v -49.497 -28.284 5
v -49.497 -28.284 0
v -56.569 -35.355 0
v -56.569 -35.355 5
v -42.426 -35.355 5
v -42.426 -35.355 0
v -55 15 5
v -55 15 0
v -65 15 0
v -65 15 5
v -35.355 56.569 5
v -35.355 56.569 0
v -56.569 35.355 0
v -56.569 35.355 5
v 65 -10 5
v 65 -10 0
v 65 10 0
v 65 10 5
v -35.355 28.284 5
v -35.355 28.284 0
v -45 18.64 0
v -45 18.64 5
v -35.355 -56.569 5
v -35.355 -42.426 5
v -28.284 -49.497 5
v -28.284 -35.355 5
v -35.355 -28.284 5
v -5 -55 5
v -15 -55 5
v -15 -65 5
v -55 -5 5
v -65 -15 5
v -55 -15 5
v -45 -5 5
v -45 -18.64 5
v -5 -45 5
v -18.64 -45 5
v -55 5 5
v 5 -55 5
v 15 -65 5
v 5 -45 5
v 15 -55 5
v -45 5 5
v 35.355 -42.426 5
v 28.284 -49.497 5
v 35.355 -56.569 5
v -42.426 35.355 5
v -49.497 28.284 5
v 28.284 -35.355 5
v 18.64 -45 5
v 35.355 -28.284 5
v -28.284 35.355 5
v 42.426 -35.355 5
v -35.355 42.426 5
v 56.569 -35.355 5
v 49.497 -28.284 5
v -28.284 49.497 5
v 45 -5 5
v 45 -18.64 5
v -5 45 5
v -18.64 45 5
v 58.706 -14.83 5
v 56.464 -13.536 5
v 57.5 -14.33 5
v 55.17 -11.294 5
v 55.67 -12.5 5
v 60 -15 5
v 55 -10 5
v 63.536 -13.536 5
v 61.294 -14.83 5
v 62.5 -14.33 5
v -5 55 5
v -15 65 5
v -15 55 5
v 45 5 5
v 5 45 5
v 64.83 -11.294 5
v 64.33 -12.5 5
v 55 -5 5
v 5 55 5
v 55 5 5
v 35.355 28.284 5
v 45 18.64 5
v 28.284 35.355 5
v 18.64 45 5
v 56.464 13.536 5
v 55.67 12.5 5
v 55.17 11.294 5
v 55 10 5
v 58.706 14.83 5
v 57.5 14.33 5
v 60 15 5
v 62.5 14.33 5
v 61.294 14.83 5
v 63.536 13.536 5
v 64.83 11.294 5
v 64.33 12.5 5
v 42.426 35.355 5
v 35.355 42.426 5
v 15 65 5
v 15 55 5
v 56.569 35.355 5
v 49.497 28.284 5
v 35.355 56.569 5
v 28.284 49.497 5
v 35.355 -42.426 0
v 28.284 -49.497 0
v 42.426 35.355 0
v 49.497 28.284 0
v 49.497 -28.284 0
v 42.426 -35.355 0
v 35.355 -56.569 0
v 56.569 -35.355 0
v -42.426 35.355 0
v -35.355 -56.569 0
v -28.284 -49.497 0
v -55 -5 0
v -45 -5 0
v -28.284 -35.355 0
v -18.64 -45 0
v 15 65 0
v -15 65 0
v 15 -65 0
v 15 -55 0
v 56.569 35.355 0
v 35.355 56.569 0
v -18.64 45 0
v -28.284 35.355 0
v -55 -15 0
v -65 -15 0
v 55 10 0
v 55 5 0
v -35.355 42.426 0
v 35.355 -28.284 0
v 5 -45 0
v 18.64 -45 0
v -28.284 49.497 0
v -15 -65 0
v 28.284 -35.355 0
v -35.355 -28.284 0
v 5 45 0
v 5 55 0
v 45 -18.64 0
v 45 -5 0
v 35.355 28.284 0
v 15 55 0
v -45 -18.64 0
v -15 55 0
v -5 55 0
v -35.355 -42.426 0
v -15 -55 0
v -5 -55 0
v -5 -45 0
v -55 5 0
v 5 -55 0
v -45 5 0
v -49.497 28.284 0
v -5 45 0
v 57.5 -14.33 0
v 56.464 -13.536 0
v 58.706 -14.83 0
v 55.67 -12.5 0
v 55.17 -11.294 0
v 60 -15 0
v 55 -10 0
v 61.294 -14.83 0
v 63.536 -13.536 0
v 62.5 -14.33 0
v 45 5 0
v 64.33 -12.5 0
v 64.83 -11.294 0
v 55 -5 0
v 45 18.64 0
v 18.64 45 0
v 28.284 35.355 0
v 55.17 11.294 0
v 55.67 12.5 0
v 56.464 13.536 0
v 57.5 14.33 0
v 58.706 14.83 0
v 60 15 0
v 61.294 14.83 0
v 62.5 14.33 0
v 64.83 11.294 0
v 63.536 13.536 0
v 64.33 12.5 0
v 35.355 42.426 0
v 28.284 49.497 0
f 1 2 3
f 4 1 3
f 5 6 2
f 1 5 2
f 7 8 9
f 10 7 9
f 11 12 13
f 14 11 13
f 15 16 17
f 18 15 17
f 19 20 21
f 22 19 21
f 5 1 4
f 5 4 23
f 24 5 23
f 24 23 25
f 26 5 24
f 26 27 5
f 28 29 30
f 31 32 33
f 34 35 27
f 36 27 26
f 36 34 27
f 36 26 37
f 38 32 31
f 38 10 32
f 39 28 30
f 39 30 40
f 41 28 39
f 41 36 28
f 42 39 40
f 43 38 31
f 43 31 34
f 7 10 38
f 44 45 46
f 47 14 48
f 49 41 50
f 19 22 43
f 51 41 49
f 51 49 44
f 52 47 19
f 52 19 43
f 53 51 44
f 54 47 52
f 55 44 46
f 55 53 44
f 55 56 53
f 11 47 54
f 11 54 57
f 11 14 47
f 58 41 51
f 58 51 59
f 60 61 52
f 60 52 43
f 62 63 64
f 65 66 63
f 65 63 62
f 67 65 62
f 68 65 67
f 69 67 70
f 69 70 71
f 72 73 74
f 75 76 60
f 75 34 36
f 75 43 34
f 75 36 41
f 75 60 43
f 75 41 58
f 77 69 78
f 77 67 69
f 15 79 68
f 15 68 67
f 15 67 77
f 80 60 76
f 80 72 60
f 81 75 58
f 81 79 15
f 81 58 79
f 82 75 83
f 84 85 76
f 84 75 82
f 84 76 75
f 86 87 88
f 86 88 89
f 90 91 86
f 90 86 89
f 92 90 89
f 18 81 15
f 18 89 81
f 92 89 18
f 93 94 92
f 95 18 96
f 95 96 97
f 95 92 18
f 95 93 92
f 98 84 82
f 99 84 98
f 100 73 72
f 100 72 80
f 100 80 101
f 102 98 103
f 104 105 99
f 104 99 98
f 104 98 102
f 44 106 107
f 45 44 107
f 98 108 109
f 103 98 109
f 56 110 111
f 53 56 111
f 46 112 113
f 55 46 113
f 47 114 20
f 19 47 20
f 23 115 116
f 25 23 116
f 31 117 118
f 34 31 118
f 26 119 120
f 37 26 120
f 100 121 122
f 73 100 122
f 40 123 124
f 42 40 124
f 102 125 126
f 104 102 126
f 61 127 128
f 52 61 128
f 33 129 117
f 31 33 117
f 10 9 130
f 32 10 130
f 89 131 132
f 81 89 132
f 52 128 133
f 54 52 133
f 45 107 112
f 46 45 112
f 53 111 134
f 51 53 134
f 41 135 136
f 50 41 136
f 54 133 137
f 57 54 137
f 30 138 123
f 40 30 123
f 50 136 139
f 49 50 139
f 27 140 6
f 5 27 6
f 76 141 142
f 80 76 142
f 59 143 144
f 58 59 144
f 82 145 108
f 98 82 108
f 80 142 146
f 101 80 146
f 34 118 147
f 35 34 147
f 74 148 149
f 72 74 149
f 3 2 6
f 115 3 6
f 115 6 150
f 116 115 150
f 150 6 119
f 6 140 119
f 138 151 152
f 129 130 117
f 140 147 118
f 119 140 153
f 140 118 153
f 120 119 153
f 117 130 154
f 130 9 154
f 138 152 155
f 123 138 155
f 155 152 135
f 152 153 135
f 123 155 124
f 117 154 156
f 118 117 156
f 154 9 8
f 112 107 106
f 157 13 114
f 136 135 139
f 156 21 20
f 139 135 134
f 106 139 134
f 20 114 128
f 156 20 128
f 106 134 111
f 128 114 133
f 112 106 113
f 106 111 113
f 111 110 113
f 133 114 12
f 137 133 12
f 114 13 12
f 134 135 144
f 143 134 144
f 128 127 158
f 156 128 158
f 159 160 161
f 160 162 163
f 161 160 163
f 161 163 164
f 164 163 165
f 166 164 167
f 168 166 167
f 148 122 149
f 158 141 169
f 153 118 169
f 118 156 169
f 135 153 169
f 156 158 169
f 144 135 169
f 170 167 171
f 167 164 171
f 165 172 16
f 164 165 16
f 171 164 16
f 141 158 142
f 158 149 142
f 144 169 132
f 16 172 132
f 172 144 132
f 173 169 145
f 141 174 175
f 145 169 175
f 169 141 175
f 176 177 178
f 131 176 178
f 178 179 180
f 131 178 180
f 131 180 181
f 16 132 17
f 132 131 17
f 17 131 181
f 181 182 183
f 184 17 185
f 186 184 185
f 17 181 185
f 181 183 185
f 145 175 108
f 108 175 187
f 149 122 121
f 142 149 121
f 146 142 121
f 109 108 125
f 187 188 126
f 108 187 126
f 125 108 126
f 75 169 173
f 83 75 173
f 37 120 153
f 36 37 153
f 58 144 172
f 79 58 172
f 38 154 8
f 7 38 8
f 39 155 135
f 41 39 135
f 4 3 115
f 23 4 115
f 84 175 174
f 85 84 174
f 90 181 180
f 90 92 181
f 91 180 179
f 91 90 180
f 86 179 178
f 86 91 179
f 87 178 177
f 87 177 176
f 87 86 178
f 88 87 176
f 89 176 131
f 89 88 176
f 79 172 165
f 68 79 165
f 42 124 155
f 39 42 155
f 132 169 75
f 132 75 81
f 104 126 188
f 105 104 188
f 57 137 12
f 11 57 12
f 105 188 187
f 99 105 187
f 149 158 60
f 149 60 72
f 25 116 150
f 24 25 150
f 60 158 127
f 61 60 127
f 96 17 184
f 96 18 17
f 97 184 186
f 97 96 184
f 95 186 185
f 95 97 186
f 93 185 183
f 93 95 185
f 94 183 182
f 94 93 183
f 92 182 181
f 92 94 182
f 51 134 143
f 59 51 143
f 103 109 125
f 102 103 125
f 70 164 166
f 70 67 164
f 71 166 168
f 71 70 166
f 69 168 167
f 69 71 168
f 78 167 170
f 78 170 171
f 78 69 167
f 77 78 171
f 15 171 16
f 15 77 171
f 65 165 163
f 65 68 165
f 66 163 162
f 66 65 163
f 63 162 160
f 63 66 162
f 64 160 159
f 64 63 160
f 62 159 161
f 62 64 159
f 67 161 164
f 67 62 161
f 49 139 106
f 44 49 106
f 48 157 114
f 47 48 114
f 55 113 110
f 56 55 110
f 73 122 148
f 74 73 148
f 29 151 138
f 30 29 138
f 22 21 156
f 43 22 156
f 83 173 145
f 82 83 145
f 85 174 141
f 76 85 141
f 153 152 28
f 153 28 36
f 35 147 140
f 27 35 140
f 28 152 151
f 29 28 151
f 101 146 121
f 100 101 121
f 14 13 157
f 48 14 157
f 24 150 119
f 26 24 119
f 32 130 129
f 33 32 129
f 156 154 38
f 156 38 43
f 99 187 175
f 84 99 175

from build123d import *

# Parameters (mm, degrees)
F0_W     = 10
F0_H     = 10
F1_DEPTH = 5
F2_R     = 4.99999


# Not quite as in the source:
# - a fillet or chamfer is up to 0.001 mm smaller than in the source, because OpenCascade refuses the exact size
# - a feature names something its author has since deleted; it is built from what else it names


with BuildPart() as f1:
    # F0 (on Top) → F1 (new body)
    with BuildSketch(Plane.XY):
        Polygon((15, 65), (-15, 65), (-15, 55), (-5, 55), (5, 55), (15, 55), align=None)
        with Locations((0, 50)):
            Rectangle(F0_W, F0_H)
        Polygon((5, 45), (-5, 45), (-18.6396103068, 45), (18.6396103068, -45), (28.2842712475, -35.3553390593), (35.3553390593, -28.2842712475), (45, -18.6396103068), (45, -5), (45, 5), (45, 18.6396103068), (35.3553390593, 28.2842712475), (28.2842712475, 35.3553390593), (18.6396103068, 45), align=None)
        Polygon((18.6396103068, -45), (-18.6396103068, 45), (-28.2842712475, 35.3553390593), (-35.3553390593, 28.2842712475), (-45, 18.6396103068), (-45, 5), (-45, -5), (-45, -18.6396103068), (-35.3553390593, -28.2842712475), (-28.2842712475, -35.3553390593), (-18.6396103068, -45), (-5, -45), (5, -45), align=None)
        Polygon((-35.3553390593, 28.2842712475), (-28.2842712475, 35.3553390593), (-35.3553390593, 42.4264068712), (-42.4264068712, 35.3553390593), align=None)
        Polygon((35.3553390593, 42.4264068712), (28.2842712475, 35.3553390593), (35.3553390593, 28.2842712475), (42.4264068712, 35.3553390593), align=None)
        Polygon((-42.4264068712, 35.3553390593), (-35.3553390593, 42.4264068712), (-28.2842712475, 49.4974746831), (-35.3553390593, 56.5685424949), (-56.5685424949, 35.3553390593), (-49.4974746831, 28.2842712475), align=None)
        with Locations((0, -50)):
            Rectangle(F0_W, F0_H)
        Polygon((35.3553390593, -28.2842712475), (28.2842712475, -35.3553390593), (35.3553390593, -42.4264068712), (42.4264068712, -35.3553390593), align=None)
        Polygon((28.2842712475, 49.4974746831), (35.3553390593, 42.4264068712), (42.4264068712, 35.3553390593), (49.4974746831, 28.2842712475), (56.5685424949, 35.3553390593), (35.3553390593, 56.5685424949), align=None)
        Polygon((15, -55), (5, -55), (-5, -55), (-15, -55), (-15, -65), (15, -65), align=None)
        Polygon((42.4264068712, -35.3553390593), (35.3553390593, -42.4264068712), (28.2842712475, -49.4974746831), (35.3553390593, -56.5685424949), (56.5685424949, -35.3553390593), (49.4974746831, -28.2842712475), align=None)
        with Locations((-50, 0)):
            Rectangle(F0_W, F0_H)
        with Locations((50, 0)):
            Rectangle(F0_W, F0_H)
        Polygon((-55, -5), (-55, 5), (-55, 15), (-65, 15), (-65, -15), (-55, -15), align=None)
        Polygon((-35.3553390593, -42.4264068712), (-28.2842712475, -35.3553390593), (-35.3553390593, -28.2842712475), (-42.4264068712, -35.3553390593), align=None)
        Polygon((55, 15), (55, 5), (55, -5), (55, -15), (65, -15), (65, 15), align=None)
        Polygon((-28.2842712475, -49.4974746831), (-35.3553390593, -42.4264068712), (-42.4264068712, -35.3553390593), (-49.4974746831, -28.2842712475), (-56.5685424949, -35.3553390593), (-35.3553390593, -56.5685424949), align=None)
    extrude(amount=F1_DEPTH)

    # F2 (radius 5 in the source; OpenCascade refuses exactly that, so slightly less here)
    f2_edges = [f1.edges().sort_by_distance(p)[0] for p in [
        (65, 15, 2.5),
        (65, -15, 2.5),
        (55, 15, 2.5),
        (55, -15, 2.5),
    ]]
    fillet(f2_edges, radius=F2_R)


solid = f1.part
